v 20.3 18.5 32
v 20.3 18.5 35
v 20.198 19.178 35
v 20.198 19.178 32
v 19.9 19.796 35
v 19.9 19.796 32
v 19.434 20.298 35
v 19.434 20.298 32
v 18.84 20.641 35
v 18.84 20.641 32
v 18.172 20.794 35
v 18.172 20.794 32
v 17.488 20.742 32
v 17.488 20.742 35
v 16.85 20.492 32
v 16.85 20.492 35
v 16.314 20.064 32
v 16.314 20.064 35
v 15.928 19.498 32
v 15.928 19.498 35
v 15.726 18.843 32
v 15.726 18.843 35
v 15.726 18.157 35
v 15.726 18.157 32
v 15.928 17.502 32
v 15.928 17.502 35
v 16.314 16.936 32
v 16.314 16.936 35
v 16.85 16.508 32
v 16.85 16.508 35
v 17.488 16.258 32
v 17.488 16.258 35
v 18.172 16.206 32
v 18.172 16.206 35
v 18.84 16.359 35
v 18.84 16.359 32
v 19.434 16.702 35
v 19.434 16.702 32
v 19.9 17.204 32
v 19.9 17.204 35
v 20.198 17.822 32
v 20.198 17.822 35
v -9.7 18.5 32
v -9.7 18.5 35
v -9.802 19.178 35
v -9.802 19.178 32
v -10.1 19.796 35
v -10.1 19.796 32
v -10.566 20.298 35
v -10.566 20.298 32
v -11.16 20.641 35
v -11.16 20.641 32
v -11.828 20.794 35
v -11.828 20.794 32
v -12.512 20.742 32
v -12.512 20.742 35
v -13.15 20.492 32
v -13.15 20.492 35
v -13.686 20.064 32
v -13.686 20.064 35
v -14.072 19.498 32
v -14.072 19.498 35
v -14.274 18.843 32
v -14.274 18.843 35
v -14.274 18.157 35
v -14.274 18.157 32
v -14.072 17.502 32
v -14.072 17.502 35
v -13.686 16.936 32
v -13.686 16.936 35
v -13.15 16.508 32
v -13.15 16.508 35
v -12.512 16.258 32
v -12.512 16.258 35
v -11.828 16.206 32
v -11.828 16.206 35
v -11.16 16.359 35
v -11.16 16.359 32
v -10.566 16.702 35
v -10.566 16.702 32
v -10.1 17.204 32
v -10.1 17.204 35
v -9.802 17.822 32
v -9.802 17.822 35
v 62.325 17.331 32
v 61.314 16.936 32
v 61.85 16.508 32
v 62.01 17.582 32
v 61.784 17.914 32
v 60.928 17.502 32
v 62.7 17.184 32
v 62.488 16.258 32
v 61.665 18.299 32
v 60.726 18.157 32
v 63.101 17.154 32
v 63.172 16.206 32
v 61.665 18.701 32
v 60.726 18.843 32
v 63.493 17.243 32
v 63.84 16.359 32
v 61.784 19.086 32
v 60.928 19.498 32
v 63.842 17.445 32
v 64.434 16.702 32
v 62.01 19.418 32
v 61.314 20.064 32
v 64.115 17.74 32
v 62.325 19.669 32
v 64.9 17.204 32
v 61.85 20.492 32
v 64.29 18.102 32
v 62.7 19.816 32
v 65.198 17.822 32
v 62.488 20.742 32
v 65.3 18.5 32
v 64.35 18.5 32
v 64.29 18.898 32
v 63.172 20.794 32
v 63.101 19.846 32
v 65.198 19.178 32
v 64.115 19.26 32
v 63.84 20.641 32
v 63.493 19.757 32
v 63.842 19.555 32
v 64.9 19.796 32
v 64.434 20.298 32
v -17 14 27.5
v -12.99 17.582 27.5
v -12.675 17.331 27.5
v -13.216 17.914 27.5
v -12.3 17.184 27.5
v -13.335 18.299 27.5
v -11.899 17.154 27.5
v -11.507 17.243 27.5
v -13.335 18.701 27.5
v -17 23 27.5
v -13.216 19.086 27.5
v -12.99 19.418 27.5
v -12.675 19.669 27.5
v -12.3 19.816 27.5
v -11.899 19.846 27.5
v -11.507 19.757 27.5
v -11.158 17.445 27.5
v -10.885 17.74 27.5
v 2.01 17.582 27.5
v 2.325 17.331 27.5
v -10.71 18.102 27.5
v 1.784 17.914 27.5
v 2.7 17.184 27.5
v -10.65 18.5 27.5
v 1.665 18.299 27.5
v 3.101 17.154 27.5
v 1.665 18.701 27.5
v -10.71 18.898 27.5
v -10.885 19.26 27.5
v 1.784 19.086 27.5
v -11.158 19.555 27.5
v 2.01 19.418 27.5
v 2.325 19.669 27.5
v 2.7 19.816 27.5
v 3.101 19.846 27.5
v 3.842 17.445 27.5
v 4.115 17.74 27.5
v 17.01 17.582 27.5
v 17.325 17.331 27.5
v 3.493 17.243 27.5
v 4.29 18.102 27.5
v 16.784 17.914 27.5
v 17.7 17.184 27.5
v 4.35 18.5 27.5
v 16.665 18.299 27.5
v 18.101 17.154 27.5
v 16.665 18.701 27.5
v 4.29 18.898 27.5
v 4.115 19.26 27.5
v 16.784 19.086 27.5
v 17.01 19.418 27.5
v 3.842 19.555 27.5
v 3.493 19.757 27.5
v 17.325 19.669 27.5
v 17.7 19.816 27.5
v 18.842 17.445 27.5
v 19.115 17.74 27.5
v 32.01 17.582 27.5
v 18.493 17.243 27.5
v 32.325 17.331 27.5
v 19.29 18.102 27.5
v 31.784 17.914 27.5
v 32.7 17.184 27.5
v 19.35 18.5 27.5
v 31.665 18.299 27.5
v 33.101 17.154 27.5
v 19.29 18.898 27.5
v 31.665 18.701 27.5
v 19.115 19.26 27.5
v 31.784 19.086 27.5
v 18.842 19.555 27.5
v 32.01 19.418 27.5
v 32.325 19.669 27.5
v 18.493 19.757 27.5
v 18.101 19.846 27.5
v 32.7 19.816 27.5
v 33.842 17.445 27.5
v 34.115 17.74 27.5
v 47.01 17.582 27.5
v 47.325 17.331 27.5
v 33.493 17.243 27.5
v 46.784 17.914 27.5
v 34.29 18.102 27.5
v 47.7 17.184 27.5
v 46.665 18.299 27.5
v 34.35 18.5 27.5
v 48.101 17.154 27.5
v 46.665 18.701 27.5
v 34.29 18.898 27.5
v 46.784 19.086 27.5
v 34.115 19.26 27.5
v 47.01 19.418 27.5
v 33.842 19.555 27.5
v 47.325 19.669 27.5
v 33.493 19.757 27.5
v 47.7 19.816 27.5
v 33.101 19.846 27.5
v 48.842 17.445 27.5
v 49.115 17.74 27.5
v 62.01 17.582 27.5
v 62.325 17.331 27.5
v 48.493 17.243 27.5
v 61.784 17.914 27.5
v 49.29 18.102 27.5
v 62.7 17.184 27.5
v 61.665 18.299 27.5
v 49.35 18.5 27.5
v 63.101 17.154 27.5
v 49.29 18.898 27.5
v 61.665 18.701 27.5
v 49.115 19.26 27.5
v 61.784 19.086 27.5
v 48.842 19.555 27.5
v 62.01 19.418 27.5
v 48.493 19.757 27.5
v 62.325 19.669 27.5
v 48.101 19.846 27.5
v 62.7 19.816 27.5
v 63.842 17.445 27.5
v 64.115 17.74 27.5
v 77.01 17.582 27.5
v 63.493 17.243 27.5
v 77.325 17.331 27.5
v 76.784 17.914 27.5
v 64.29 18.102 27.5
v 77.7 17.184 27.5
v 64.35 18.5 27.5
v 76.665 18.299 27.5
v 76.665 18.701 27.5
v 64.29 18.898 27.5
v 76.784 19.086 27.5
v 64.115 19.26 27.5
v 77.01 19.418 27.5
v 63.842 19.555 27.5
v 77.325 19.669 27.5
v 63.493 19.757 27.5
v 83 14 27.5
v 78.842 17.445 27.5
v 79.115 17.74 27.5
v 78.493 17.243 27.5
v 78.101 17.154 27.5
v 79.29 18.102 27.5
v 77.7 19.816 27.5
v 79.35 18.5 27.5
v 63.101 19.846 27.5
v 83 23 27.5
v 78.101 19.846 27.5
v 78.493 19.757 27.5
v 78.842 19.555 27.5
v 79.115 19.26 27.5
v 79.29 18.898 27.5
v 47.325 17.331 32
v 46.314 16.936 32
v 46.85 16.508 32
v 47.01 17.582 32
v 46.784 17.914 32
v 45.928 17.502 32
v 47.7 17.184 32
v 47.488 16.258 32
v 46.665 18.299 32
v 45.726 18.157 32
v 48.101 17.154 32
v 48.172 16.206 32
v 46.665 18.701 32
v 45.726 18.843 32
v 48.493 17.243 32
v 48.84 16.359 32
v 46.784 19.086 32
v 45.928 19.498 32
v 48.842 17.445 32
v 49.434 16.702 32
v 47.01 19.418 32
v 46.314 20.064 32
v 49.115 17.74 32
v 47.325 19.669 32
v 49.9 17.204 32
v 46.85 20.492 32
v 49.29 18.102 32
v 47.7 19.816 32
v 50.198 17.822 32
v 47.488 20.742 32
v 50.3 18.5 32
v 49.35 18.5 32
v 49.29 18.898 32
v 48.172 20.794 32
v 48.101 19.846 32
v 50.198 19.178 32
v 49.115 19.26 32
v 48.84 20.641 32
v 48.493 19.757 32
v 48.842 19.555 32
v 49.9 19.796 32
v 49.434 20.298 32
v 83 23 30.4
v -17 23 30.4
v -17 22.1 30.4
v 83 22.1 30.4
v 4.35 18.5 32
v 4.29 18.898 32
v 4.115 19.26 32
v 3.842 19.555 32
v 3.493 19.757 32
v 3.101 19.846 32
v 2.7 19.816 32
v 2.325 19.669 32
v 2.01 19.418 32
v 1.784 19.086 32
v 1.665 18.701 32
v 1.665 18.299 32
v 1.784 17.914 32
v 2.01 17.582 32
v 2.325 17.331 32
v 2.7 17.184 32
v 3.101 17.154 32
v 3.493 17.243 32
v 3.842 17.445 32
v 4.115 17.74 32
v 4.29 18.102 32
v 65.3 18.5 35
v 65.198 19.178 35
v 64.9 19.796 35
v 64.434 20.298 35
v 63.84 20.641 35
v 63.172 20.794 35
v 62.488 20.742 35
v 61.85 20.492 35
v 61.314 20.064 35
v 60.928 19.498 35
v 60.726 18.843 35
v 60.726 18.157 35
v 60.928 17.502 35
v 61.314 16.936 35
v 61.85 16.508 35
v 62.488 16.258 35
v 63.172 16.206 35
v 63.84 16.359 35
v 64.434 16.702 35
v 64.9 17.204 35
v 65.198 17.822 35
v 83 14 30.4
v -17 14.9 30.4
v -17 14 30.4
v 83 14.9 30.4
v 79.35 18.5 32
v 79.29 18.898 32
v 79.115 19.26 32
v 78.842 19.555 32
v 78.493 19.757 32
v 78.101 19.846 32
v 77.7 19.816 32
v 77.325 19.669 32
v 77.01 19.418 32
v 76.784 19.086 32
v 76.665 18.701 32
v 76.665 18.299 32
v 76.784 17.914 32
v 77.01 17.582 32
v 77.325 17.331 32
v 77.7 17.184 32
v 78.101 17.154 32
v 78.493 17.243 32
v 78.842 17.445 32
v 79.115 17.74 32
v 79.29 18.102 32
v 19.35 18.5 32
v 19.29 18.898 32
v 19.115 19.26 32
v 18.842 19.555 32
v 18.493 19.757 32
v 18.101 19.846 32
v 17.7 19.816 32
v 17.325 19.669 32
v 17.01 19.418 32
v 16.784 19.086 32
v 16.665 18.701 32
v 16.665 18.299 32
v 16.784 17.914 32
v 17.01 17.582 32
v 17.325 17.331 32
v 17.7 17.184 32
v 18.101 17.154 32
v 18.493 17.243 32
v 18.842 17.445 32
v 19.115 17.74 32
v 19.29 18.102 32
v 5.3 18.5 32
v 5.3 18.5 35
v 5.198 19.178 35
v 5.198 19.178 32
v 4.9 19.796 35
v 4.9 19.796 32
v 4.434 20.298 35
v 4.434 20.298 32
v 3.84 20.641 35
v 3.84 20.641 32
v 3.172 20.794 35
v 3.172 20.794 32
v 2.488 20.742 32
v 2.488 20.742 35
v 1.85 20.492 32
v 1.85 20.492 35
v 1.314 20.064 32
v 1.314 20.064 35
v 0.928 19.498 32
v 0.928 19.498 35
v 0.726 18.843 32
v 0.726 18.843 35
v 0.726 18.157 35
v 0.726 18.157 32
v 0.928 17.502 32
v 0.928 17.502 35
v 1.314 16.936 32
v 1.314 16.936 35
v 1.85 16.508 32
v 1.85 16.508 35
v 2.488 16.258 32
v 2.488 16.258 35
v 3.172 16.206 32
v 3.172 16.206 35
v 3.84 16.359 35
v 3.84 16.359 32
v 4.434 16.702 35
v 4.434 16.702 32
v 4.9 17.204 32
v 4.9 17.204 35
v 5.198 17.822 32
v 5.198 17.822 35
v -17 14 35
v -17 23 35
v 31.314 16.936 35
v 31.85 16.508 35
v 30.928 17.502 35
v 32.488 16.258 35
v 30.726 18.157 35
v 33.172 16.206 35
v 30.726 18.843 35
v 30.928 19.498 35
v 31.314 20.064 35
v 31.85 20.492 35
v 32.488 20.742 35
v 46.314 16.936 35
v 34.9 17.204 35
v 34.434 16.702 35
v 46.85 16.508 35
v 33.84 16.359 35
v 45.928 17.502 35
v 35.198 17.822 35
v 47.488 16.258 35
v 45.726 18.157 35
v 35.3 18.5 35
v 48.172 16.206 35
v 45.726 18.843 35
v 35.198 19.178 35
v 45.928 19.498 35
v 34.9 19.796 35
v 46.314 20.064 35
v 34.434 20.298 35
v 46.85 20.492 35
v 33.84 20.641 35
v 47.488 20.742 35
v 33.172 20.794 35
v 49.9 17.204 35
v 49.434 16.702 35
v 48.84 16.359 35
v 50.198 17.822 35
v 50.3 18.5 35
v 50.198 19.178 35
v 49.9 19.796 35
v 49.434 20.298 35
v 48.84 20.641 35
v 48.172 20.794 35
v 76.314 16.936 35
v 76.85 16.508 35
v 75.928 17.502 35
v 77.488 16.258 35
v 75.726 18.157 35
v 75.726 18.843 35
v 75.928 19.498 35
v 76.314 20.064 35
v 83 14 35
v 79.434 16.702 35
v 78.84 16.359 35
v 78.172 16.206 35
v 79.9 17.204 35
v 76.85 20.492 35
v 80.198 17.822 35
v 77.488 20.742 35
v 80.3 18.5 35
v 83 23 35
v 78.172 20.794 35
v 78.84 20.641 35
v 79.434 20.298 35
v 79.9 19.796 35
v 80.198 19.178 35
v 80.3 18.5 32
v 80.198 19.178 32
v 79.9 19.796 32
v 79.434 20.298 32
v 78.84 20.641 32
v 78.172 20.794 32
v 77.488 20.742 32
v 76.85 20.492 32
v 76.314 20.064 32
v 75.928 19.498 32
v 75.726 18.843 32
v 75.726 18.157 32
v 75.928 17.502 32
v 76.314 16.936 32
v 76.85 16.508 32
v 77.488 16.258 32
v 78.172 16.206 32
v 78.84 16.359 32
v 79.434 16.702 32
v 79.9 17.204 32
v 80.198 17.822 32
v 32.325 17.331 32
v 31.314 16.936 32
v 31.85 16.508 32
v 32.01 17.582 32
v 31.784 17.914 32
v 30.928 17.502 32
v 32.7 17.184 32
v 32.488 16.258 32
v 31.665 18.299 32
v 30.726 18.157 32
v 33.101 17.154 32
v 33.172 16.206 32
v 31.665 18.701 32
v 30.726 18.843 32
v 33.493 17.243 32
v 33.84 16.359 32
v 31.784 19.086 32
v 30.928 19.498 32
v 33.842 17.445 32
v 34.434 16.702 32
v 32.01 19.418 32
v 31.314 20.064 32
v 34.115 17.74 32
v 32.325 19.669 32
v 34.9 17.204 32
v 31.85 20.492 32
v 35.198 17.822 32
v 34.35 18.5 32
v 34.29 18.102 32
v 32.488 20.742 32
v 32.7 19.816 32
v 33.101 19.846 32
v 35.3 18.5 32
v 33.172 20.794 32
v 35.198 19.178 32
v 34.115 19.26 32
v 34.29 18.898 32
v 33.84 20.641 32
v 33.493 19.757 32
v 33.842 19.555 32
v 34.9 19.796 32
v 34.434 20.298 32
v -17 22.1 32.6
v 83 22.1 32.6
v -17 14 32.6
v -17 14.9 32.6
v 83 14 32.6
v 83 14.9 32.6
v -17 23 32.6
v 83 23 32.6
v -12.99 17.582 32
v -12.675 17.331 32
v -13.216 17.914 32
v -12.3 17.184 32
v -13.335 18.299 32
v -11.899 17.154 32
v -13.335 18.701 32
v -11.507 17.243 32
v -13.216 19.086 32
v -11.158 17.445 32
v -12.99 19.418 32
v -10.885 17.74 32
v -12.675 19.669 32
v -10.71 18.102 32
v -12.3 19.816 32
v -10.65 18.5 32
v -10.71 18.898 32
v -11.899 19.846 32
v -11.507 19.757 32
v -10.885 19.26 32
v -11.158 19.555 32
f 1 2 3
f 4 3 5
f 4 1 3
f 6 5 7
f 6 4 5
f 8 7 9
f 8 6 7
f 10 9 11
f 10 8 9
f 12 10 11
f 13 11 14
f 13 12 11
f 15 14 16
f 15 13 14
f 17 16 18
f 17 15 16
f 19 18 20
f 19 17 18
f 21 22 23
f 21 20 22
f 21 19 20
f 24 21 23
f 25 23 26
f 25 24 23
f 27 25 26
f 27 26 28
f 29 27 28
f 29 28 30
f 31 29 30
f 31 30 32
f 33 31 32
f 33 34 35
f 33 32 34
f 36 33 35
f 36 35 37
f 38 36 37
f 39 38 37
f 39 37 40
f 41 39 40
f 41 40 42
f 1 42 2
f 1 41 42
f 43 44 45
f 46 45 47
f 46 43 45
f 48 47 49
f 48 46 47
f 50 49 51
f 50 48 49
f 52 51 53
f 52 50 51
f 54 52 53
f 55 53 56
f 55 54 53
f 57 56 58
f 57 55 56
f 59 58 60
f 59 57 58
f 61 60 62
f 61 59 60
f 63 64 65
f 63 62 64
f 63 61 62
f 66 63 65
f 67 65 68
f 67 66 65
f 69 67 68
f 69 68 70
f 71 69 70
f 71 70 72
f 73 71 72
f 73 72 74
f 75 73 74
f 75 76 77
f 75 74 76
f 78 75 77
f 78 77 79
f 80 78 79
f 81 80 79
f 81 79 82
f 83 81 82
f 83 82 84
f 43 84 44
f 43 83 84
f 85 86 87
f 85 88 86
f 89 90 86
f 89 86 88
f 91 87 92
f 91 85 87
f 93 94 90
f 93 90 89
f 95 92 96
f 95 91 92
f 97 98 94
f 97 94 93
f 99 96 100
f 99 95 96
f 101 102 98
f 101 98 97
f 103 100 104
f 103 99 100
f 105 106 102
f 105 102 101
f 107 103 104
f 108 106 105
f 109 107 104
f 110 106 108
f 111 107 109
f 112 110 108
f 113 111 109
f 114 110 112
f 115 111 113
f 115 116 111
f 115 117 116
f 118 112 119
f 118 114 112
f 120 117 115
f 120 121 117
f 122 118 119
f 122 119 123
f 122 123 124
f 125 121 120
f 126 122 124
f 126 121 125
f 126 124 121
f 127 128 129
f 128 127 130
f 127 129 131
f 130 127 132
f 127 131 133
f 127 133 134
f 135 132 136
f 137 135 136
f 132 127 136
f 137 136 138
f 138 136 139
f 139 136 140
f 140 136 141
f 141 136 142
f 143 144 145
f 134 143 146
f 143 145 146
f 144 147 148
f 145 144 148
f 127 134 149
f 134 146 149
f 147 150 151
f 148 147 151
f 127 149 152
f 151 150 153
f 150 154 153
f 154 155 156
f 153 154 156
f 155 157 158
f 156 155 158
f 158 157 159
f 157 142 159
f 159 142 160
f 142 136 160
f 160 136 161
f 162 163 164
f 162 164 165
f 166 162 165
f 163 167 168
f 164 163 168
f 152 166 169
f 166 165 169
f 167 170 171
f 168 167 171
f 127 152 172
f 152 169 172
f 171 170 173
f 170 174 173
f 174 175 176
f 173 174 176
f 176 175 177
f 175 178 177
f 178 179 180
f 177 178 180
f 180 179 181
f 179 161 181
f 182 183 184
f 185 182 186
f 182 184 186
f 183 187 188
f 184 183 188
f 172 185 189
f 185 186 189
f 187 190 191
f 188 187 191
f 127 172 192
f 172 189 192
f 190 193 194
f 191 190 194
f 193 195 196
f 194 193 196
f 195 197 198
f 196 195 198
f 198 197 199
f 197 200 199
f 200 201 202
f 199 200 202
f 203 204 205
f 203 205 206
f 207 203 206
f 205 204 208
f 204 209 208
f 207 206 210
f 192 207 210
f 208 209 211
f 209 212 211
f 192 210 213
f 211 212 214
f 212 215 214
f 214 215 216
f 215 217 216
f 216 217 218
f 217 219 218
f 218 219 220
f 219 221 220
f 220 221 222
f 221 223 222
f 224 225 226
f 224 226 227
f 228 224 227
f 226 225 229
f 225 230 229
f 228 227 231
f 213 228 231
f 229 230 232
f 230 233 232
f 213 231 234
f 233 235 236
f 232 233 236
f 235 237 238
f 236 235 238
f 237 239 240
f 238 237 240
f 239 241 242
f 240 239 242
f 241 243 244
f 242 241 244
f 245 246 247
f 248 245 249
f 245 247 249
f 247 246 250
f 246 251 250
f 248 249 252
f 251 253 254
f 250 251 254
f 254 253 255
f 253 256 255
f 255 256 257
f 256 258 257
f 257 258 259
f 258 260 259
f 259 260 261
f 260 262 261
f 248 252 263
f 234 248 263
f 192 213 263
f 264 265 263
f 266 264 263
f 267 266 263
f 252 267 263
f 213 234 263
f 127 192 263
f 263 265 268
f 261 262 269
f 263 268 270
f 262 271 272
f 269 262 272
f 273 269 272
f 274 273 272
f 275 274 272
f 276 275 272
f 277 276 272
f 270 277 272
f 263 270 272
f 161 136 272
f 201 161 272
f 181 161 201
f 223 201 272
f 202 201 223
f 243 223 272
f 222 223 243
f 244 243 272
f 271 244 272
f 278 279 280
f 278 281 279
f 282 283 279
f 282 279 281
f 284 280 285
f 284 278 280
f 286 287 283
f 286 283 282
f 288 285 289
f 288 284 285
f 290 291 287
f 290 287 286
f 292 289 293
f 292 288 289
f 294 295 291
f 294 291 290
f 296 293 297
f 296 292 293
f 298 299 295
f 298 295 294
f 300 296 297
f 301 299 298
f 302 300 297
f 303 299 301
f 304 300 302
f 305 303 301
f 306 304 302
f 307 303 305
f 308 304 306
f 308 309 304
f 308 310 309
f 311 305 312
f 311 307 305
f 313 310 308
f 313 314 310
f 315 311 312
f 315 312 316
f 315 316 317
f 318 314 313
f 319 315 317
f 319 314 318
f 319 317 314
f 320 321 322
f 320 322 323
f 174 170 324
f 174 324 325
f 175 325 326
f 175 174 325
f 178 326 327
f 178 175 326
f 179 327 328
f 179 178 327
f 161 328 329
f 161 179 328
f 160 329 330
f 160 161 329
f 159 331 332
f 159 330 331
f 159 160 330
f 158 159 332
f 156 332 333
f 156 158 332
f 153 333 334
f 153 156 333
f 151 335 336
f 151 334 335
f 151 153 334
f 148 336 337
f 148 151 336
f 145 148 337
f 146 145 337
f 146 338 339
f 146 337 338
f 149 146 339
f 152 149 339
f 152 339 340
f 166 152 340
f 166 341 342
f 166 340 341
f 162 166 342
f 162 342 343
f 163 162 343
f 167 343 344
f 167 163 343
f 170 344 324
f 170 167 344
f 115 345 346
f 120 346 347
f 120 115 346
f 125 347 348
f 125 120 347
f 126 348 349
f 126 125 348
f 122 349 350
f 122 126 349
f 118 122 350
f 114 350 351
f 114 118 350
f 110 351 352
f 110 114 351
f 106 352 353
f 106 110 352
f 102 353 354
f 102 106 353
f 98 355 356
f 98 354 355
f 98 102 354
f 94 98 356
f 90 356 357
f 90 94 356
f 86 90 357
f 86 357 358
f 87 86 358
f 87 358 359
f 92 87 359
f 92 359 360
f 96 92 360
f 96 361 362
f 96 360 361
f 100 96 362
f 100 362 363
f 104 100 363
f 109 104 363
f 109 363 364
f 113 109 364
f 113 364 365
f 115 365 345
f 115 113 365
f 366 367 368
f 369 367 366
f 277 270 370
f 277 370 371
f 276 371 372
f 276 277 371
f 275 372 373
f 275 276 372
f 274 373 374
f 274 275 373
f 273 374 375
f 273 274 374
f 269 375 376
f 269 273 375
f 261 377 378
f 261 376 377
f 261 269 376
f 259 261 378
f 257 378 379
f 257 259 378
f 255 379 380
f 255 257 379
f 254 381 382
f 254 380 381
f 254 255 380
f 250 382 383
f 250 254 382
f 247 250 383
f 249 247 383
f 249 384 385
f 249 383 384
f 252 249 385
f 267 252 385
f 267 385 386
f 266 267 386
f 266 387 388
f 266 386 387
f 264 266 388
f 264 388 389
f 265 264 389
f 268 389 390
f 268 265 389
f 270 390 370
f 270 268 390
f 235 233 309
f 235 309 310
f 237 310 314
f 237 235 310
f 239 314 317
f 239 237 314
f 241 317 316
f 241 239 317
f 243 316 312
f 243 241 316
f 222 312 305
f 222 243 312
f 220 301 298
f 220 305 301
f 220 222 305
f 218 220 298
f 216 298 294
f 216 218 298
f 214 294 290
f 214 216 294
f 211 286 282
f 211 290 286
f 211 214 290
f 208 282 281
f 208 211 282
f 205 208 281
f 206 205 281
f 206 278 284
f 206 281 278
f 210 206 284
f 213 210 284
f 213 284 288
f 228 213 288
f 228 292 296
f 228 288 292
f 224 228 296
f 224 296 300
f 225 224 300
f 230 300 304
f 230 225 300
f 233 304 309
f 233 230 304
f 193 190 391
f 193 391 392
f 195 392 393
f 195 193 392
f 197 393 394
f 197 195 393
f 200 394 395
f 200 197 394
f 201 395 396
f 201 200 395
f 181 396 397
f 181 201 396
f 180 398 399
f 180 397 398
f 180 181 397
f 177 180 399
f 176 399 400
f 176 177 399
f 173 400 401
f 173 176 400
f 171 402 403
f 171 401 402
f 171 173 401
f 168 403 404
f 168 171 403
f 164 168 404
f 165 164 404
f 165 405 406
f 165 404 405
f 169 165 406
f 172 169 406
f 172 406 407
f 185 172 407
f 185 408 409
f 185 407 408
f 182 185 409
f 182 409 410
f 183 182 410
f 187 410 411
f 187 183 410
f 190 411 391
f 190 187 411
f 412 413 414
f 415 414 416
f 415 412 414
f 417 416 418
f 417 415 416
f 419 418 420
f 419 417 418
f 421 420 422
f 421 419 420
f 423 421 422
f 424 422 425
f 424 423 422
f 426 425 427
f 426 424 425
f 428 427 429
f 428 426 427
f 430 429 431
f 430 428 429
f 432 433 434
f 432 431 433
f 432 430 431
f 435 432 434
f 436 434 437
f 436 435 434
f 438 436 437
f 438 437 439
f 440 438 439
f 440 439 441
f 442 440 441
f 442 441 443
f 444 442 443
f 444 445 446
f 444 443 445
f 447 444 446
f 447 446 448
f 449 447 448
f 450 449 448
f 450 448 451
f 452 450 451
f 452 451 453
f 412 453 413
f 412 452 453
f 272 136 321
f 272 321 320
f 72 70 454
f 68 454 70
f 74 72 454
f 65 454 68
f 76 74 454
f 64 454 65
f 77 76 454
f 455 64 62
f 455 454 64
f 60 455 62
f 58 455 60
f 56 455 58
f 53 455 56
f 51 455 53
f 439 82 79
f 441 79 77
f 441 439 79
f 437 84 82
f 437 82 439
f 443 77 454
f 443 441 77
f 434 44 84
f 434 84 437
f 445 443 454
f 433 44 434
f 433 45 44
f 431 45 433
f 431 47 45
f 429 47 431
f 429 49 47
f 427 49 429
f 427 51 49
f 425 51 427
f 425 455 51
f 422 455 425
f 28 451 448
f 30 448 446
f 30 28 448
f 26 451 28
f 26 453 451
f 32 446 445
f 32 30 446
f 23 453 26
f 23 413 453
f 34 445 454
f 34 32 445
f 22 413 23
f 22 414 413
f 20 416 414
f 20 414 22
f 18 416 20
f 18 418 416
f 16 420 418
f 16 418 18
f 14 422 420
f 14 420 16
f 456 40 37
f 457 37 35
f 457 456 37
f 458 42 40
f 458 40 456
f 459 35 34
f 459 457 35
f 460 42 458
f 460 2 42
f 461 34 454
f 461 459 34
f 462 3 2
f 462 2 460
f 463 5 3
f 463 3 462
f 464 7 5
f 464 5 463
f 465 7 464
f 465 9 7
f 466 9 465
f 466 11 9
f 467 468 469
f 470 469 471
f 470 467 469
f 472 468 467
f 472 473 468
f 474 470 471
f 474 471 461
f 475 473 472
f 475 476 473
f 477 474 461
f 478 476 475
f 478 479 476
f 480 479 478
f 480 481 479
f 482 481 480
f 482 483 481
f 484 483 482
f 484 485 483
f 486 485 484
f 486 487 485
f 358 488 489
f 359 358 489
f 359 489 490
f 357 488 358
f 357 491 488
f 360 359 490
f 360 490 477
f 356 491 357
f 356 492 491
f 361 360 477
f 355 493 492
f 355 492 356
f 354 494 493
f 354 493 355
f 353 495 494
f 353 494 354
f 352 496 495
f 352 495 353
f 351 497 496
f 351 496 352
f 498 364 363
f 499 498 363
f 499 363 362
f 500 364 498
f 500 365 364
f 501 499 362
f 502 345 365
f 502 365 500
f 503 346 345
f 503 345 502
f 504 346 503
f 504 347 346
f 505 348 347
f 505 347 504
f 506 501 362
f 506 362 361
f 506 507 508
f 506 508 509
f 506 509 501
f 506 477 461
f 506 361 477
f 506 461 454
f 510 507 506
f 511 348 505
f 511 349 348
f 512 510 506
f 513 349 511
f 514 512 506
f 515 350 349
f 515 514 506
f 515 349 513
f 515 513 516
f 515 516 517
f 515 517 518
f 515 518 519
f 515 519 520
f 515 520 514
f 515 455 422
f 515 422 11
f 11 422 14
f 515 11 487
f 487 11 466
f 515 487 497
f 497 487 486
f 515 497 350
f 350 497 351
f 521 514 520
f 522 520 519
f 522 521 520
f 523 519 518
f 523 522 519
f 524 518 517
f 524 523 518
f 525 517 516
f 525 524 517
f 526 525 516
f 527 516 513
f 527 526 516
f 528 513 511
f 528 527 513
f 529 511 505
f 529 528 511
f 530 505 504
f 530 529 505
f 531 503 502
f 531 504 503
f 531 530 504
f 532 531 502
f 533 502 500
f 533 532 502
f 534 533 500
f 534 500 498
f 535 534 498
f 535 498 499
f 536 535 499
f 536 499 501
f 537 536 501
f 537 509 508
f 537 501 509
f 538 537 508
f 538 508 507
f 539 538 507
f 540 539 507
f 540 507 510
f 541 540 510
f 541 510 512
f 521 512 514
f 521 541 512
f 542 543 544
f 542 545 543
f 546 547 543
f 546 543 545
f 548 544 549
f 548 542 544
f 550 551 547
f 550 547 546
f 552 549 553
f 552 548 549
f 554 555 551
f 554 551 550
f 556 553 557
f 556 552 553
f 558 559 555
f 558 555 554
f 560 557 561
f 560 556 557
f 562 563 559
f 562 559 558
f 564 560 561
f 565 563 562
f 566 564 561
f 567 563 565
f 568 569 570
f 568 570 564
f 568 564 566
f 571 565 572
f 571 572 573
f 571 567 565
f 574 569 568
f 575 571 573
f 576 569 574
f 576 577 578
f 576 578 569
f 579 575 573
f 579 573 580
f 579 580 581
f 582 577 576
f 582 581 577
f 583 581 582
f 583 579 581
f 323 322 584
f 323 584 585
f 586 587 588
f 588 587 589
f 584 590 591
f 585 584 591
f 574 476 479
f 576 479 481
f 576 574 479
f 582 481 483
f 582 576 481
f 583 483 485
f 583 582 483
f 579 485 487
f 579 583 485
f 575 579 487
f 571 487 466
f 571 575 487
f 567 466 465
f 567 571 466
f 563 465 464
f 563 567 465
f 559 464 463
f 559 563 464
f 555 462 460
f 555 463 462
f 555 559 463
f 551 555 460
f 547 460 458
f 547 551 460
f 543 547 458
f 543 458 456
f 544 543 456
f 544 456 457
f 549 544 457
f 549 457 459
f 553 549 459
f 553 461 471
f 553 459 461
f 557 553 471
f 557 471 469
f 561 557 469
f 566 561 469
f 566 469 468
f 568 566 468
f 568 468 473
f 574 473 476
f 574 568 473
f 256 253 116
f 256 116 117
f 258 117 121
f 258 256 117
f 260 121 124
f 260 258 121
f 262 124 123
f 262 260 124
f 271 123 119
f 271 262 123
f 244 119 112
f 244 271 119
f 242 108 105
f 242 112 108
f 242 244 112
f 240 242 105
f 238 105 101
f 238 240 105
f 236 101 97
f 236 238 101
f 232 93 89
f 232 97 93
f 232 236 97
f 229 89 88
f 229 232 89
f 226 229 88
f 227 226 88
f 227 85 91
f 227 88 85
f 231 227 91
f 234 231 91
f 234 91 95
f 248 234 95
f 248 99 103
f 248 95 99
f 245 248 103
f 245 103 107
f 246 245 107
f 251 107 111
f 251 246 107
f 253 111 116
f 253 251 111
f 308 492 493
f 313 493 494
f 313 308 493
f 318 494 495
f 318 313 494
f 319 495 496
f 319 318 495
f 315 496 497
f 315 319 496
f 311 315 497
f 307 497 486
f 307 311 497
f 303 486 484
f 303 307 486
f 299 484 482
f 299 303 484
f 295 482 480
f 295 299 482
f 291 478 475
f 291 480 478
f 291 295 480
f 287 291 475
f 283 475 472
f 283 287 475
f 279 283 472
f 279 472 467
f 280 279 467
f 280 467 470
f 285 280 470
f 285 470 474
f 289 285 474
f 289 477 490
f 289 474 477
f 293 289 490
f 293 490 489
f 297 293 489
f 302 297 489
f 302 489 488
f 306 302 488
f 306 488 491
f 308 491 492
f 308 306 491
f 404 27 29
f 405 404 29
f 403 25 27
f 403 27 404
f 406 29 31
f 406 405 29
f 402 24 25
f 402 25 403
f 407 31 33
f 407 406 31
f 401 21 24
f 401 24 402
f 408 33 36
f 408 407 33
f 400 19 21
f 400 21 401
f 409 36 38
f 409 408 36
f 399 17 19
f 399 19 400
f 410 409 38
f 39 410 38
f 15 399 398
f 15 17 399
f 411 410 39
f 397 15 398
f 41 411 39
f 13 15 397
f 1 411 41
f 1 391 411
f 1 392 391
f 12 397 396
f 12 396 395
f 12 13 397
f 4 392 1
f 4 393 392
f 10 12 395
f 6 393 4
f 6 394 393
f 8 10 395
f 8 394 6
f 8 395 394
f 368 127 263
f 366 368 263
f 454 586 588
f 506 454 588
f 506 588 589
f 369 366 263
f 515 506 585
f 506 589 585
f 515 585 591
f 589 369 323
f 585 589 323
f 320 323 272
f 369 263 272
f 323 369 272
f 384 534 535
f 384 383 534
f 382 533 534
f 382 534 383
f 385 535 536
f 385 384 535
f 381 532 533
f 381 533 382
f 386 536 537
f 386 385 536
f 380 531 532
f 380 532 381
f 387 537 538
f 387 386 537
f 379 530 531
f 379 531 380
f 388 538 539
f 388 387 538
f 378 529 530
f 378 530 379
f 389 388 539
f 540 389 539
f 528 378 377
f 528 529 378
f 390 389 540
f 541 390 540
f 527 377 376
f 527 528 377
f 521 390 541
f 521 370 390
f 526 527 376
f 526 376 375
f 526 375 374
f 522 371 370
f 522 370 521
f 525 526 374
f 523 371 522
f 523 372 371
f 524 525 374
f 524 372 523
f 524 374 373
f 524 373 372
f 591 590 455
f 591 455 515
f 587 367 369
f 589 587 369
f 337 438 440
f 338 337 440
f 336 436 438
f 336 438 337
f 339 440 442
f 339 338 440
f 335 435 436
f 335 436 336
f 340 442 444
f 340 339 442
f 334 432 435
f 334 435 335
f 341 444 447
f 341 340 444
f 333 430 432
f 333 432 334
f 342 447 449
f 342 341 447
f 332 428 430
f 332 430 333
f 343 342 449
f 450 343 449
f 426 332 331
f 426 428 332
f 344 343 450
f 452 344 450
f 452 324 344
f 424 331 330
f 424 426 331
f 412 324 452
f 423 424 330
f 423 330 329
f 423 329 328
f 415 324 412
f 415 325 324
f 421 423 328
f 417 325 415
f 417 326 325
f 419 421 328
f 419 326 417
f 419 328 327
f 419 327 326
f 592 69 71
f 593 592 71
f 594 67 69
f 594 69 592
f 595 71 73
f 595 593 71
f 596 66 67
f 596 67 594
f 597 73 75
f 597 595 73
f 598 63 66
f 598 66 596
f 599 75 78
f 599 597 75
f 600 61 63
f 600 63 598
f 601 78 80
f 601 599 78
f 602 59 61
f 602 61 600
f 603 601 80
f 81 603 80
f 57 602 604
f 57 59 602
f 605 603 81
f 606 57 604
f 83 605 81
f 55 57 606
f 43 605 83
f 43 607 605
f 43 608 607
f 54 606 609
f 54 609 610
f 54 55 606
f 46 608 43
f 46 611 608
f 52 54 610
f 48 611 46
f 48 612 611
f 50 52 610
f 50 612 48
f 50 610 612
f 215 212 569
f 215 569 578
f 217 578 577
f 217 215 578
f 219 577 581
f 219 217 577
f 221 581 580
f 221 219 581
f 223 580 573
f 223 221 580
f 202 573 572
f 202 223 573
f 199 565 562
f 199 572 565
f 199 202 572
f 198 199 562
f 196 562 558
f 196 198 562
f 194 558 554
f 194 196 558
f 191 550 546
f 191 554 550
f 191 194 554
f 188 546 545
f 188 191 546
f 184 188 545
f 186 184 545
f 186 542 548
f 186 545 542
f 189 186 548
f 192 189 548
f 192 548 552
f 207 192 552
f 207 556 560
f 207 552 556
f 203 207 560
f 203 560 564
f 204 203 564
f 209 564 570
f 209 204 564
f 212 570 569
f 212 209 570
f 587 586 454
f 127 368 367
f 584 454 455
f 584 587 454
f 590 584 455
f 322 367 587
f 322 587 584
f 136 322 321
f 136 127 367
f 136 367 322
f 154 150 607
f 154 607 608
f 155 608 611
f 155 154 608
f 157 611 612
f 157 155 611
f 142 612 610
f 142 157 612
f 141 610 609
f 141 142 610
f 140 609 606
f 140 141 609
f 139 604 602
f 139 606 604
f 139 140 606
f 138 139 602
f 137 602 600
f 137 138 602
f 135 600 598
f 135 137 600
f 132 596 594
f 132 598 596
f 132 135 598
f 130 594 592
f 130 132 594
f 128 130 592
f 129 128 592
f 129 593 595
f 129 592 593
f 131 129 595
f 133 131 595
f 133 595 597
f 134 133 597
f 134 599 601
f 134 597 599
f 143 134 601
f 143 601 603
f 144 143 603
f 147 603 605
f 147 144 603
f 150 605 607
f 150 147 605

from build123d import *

# Parameters (mm, degrees)
F_100_START                            = 27.5
F_100_MM_RAIL_BLANK_PROFILE_W          = 100
F_100_MM_RAIL_BLANK_PROFILE_H          = 9
F_100_MM_RAIL_BLANK_DEPTH              = 7.5
LONGITUDINAL_START                     = 30.4
LONGITUDINAL_RUNNING_GROOVES_PROFILE_W = 100.2
LONGITUDINAL_RUNNING_GROOVES_PROFILE_H = 1.4
LONGITUDINAL_RUNNING_GROOVES_DEPTH     = 2.2
RAIL_START                             = 27.4
RAIL_BOLT_CLEARANCE_PROFILE_R          = 1.35
RAIL_BOLT_CLEARANCE_DEPTH              = 7.8
RAIL_START_2                           = 32
RAIL_HEAD_RECESSES_PROFILE_R           = 2.3
RAIL_HEAD_RECESSES_DEPTH               = 3.2


with BuildPart() as part:
    # 100 mm rail blank profile → 100 mm rail blank (new body)
    with BuildSketch(Plane.XY.offset(F_100_START)):
        with Locations((33, 18.5)):
            Rectangle(F_100_MM_RAIL_BLANK_PROFILE_W, F_100_MM_RAIL_BLANK_PROFILE_H)
    extrude(amount=F_100_MM_RAIL_BLANK_DEPTH)

    # Longitudinal running grooves profile → Longitudinal running grooves (cut)
    with BuildSketch(Plane.XY.offset(LONGITUDINAL_START)):
        with Locations((33, 14.2)):
            Rectangle(LONGITUDINAL_RUNNING_GROOVES_PROFILE_W, LONGITUDINAL_RUNNING_GROOVES_PROFILE_H)
        with Locations((33, 22.8)):
            Rectangle(LONGITUDINAL_RUNNING_GROOVES_PROFILE_W, LONGITUDINAL_RUNNING_GROOVES_PROFILE_H)
    extrude(amount=LONGITUDINAL_RUNNING_GROOVES_DEPTH, mode=Mode.SUBTRACT)

    # Rail bolt clearance profile → Rail bolt clearance (cut)
    with BuildSketch(Plane.XY.offset(RAIL_START)):
        with Locations((-12, 18.5)):
            Circle(RAIL_BOLT_CLEARANCE_PROFILE_R)
        with Locations((3, 18.5)):
            Circle(RAIL_BOLT_CLEARANCE_PROFILE_R)
        with Locations((18, 18.5)):
            Circle(RAIL_BOLT_CLEARANCE_PROFILE_R)
        with Locations((33, 18.5)):
            Circle(RAIL_BOLT_CLEARANCE_PROFILE_R)
        with Locations((48, 18.5)):
            Circle(RAIL_BOLT_CLEARANCE_PROFILE_R)
        with Locations((63, 18.5)):
            Circle(RAIL_BOLT_CLEARANCE_PROFILE_R)
        with Locations((78, 18.5)):
            Circle(RAIL_BOLT_CLEARANCE_PROFILE_R)
    extrude(amount=RAIL_BOLT_CLEARANCE_DEPTH, mode=Mode.SUBTRACT)

    # Rail head recesses profile → Rail head recesses (cut)
    with BuildSketch(Plane.XY.offset(RAIL_START_2)):
        with Locations((-12, 18.5)):
            Circle(RAIL_HEAD_RECESSES_PROFILE_R)
        with Locations((3, 18.5)):
            Circle(RAIL_HEAD_RECESSES_PROFILE_R)
        with Locations((18, 18.5)):
            Circle(RAIL_HEAD_RECESSES_PROFILE_R)
        with Locations((33, 18.5)):
            Circle(RAIL_HEAD_RECESSES_PROFILE_R)
        with Locations((48, 18.5)):
            Circle(RAIL_HEAD_RECESSES_PROFILE_R)
        with Locations((63, 18.5)):
            Circle(RAIL_HEAD_RECESSES_PROFILE_R)
        with Locations((78, 18.5)):
            Circle(RAIL_HEAD_RECESSES_PROFILE_R)
    extrude(amount=RAIL_HEAD_RECESSES_DEPTH, mode=Mode.SUBTRACT)


solid = part.part
